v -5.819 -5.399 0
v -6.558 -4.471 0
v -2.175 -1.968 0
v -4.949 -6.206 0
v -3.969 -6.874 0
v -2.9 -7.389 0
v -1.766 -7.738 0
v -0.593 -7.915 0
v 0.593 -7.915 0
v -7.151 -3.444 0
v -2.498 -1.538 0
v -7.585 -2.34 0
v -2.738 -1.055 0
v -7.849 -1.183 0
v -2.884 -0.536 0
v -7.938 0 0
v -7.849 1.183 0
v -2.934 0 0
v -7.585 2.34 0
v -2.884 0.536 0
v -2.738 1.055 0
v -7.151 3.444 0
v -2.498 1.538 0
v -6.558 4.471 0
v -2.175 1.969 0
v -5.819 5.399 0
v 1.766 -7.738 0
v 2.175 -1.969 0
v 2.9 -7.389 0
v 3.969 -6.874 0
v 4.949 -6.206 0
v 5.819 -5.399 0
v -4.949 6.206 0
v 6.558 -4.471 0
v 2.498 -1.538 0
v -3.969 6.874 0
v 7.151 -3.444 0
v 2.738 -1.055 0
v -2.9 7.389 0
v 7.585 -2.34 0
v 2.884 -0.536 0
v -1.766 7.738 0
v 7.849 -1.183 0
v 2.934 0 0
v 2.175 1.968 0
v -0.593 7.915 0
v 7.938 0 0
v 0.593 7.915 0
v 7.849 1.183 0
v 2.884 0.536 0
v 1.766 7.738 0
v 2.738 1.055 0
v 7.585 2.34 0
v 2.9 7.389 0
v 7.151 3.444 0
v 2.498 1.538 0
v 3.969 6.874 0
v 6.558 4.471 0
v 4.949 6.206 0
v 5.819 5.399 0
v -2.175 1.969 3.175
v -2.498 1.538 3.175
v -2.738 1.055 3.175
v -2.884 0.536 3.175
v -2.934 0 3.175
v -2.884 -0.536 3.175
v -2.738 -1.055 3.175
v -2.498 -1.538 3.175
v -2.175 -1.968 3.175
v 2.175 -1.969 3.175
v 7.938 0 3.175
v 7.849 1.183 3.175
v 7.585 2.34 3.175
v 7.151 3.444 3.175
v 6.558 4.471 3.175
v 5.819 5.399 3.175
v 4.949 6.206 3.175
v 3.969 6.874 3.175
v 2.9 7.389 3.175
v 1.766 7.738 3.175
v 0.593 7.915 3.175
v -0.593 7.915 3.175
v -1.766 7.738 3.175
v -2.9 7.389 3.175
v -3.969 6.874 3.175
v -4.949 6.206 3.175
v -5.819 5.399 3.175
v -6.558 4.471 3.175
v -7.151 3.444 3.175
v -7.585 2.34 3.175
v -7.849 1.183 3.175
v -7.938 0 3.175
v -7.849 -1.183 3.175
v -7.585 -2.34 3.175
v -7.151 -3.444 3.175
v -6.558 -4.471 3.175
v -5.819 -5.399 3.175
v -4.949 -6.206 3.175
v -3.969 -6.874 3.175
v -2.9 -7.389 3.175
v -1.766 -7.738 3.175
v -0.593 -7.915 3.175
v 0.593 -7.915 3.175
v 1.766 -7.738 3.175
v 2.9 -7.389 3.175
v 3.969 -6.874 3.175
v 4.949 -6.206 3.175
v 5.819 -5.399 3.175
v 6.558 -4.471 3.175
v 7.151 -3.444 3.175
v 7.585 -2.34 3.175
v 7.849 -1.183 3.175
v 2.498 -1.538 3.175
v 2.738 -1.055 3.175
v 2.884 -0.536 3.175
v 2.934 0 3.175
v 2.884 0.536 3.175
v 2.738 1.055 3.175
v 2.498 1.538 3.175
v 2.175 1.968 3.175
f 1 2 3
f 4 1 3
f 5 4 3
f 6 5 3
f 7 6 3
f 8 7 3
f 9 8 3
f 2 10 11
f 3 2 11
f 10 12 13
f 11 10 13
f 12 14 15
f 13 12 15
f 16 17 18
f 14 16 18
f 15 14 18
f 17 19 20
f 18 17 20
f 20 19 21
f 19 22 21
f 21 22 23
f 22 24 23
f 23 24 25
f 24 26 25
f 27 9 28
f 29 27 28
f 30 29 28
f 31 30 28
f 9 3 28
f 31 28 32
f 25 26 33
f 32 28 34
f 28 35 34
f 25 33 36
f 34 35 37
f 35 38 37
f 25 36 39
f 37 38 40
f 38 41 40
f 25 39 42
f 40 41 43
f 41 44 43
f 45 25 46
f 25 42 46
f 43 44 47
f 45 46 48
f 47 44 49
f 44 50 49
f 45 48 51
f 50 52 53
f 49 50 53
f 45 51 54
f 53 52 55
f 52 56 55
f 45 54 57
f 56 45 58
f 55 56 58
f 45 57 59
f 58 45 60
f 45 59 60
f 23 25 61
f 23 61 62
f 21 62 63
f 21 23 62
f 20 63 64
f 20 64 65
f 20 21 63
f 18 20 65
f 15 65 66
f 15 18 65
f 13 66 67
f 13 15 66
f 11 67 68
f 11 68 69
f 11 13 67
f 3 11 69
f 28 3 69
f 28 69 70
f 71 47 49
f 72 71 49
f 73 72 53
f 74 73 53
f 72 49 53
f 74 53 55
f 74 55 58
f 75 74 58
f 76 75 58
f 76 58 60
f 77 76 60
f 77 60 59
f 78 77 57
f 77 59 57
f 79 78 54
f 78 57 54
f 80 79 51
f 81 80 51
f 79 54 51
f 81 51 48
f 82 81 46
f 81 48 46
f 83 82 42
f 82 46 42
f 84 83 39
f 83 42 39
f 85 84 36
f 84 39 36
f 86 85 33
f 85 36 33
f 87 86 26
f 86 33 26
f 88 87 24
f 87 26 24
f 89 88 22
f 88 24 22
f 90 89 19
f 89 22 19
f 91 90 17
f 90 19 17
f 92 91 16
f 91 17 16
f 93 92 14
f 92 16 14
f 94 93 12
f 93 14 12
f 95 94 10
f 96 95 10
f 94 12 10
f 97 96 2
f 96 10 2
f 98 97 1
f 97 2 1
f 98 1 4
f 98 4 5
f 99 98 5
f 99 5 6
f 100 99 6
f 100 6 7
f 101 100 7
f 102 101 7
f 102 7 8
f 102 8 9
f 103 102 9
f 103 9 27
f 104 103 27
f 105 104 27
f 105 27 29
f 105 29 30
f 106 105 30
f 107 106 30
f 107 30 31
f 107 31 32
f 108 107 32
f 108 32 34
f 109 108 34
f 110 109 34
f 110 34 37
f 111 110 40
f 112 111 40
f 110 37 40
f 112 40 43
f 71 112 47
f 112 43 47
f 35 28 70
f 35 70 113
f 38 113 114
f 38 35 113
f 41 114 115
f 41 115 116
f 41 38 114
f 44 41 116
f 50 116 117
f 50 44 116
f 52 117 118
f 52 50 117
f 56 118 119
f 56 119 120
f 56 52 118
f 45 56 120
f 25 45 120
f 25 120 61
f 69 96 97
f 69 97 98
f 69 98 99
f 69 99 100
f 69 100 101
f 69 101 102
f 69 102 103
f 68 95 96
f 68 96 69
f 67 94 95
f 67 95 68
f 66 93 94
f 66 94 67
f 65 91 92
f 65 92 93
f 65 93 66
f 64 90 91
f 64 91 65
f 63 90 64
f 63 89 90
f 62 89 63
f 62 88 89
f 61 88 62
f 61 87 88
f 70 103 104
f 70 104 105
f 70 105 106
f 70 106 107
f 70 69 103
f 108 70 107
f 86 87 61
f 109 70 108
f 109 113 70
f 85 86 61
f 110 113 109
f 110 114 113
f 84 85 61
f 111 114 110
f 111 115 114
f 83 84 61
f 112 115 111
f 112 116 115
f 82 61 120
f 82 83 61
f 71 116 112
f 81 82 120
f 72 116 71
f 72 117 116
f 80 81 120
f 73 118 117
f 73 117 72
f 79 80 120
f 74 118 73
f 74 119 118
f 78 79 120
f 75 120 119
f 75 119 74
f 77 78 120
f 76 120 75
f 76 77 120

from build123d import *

# Parameters (mm, degrees)
SKETCH1_R           = 7.9375
BOSS_EXTRUDE1_DEPTH = 3.175


with BuildPart() as part:
    # Sketch1 → Boss-Extrude1 (new body)
    with BuildSketch(Plane.XY):
        Circle(SKETCH1_R)
        with BuildLine():
            ThreePointArc((-2.175224917, 1.9685), (-2.9337, 0), (-2.175224917, -1.9685))
            Line((-2.175224917, -1.9685), (2.175224917, -1.9685))
            ThreePointArc((2.175224917, -1.9685), (2.9337, 0), (2.175224917, 1.9685))
            Line((2.175224917, 1.9685), (-2.175224917, 1.9685))
        make_face(mode=Mode.SUBTRACT)
    extrude(amount=BOSS_EXTRUDE1_DEPTH)


solid = part.part
